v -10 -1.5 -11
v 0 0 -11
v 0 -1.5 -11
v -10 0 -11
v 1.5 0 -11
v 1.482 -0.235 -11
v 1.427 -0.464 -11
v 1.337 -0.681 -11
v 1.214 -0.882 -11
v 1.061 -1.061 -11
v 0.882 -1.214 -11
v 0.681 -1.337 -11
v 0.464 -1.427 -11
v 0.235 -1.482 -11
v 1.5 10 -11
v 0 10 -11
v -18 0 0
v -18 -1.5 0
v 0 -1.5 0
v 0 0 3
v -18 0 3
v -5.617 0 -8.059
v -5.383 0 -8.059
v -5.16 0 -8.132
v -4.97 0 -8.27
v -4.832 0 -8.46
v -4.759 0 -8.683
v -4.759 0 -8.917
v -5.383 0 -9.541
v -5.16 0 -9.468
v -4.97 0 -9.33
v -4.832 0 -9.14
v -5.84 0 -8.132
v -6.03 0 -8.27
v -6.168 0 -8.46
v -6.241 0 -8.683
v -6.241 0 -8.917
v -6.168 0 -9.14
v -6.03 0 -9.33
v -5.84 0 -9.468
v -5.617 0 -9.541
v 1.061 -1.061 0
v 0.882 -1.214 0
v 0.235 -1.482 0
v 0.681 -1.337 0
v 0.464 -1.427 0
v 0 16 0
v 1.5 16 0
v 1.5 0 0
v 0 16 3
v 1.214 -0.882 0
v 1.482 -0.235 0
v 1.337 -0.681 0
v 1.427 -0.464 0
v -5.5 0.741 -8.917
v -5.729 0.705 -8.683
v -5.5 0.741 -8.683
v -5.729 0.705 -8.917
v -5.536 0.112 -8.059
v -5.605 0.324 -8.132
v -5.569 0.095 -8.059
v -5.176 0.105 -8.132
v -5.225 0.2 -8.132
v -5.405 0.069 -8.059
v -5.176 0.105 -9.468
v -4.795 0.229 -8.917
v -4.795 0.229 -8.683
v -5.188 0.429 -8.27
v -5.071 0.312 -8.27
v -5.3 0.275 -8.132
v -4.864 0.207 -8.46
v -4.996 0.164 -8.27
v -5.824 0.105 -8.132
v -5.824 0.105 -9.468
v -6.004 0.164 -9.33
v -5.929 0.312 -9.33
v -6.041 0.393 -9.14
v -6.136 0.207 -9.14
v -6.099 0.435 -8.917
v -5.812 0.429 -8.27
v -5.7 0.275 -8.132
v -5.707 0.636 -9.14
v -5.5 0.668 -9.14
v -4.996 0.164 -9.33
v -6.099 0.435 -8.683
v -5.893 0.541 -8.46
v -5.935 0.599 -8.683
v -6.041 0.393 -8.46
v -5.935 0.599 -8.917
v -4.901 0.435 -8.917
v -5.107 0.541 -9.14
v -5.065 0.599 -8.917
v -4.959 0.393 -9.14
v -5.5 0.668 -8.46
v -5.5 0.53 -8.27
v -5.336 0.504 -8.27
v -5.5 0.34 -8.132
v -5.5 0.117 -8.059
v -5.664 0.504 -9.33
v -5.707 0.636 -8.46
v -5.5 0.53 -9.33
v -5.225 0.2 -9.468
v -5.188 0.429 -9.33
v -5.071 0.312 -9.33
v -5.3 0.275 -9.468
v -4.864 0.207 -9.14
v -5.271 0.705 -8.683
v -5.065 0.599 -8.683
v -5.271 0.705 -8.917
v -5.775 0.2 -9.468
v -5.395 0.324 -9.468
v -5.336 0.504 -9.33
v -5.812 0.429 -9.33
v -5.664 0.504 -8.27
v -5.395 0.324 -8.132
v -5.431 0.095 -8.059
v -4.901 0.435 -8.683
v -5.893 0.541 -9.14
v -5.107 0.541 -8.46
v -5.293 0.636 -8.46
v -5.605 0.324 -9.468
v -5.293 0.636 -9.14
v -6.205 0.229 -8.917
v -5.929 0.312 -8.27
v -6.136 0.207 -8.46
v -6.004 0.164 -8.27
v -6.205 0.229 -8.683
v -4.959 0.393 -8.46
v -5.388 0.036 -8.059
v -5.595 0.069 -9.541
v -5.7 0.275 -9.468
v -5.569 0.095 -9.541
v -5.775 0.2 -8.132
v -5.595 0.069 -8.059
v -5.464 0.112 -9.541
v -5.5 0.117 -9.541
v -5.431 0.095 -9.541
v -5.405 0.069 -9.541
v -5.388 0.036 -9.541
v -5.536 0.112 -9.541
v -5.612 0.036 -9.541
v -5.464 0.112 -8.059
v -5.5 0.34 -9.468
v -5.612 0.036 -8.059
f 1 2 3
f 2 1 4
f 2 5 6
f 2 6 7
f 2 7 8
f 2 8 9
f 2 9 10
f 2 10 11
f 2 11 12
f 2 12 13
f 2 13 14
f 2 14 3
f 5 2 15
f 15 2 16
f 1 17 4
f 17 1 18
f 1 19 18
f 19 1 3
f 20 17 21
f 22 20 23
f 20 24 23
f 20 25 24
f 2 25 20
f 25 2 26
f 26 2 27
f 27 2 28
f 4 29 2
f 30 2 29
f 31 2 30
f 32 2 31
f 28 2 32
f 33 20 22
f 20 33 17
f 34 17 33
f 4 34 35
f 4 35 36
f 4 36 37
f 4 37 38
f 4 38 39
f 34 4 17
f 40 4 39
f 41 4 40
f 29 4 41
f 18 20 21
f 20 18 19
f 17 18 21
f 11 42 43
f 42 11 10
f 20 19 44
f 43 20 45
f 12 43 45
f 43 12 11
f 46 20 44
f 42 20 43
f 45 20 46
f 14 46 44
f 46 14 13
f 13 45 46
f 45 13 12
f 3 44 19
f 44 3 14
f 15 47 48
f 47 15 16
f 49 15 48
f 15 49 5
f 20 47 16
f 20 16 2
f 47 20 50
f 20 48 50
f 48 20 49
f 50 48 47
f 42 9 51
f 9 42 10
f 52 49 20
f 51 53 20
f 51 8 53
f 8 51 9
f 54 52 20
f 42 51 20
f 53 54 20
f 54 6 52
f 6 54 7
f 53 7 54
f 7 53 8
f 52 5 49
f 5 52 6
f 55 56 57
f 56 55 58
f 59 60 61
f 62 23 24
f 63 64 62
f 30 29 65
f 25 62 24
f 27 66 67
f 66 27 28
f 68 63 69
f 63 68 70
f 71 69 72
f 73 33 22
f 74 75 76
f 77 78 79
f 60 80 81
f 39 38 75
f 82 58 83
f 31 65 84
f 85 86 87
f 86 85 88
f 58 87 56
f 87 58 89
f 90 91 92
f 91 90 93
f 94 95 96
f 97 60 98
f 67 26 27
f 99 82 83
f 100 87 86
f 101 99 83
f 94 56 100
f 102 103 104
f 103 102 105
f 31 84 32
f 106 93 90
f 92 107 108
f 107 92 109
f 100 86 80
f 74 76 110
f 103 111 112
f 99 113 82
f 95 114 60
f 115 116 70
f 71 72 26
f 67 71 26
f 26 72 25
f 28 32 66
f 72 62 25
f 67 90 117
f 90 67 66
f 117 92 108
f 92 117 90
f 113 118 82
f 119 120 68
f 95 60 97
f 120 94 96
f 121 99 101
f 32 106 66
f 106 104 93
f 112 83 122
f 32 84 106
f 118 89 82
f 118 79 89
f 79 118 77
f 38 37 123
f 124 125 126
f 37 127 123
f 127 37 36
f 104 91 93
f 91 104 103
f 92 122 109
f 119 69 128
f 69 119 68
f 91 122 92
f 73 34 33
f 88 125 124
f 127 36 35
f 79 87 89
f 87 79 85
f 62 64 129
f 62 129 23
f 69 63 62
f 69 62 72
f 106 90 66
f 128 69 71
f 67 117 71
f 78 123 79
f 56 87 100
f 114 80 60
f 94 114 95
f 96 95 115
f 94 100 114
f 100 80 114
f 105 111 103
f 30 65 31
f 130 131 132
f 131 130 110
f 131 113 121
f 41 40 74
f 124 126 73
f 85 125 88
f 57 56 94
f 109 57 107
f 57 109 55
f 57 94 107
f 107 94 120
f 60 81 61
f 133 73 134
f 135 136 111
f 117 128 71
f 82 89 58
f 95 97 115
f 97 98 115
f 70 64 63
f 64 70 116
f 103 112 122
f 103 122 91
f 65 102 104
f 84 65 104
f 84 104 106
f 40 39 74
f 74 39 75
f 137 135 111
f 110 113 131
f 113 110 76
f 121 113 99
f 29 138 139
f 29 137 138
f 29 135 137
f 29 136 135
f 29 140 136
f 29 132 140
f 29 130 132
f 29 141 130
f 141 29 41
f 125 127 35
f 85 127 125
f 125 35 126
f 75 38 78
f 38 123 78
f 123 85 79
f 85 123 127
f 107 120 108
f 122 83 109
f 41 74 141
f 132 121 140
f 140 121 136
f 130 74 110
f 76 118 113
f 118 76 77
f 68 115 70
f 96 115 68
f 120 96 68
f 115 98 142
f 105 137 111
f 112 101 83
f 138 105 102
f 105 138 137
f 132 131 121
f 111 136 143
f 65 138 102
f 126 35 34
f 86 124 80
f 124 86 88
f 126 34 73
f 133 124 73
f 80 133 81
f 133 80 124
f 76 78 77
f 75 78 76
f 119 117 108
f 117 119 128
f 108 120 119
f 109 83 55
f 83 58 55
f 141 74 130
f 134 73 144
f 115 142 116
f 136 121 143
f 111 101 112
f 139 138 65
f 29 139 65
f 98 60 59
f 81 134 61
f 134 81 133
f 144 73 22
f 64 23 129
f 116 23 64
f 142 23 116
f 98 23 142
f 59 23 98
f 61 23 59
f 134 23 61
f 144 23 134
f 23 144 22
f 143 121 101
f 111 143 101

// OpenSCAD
module base_clip() {
    module base_clip_side(width=18) {
        wb=width;
        wt=10;
        h=11;
        t=1.5;
        
        // clip
        rotate(90, [1, 0, 0])
        translate([-wb, -h, 0])
        linear_extrude(height=t)
        polygon([
            [0, h],
            [wb-wt, 0],
            [wb, 0],
            [wb, h]
        ]);
        
        // top
        rotate(-90, [0, 0, 1])
        rotate(90, [1, 0, 0])
        linear_extrude(height=wb)
        polygon([
            [0, 0],
            [0, t*2],
            [t, 0]
        ]);
        
        // corner
        rotate(-45, [0, 0, 1])
        rotate_extrude(angle=-45, $fn=40)
        polygon([
            [0, t*2],
            [t, 0],
            [t, -h],
            [0, -h]
        ]);
    }

    hole_x=5.5;
    hole_y=8.8;
    
    union() {
        color("red") base_clip_side();
        color("blue") mirror([1, 0, 0]) rotate(-90, [0, 0, 1]) base_clip_side(16);
        color("yellow") translate([-hole_x, 0, -hole_y]) sphere(d=1.5, $fn=20);
    };
}

base_clip();
